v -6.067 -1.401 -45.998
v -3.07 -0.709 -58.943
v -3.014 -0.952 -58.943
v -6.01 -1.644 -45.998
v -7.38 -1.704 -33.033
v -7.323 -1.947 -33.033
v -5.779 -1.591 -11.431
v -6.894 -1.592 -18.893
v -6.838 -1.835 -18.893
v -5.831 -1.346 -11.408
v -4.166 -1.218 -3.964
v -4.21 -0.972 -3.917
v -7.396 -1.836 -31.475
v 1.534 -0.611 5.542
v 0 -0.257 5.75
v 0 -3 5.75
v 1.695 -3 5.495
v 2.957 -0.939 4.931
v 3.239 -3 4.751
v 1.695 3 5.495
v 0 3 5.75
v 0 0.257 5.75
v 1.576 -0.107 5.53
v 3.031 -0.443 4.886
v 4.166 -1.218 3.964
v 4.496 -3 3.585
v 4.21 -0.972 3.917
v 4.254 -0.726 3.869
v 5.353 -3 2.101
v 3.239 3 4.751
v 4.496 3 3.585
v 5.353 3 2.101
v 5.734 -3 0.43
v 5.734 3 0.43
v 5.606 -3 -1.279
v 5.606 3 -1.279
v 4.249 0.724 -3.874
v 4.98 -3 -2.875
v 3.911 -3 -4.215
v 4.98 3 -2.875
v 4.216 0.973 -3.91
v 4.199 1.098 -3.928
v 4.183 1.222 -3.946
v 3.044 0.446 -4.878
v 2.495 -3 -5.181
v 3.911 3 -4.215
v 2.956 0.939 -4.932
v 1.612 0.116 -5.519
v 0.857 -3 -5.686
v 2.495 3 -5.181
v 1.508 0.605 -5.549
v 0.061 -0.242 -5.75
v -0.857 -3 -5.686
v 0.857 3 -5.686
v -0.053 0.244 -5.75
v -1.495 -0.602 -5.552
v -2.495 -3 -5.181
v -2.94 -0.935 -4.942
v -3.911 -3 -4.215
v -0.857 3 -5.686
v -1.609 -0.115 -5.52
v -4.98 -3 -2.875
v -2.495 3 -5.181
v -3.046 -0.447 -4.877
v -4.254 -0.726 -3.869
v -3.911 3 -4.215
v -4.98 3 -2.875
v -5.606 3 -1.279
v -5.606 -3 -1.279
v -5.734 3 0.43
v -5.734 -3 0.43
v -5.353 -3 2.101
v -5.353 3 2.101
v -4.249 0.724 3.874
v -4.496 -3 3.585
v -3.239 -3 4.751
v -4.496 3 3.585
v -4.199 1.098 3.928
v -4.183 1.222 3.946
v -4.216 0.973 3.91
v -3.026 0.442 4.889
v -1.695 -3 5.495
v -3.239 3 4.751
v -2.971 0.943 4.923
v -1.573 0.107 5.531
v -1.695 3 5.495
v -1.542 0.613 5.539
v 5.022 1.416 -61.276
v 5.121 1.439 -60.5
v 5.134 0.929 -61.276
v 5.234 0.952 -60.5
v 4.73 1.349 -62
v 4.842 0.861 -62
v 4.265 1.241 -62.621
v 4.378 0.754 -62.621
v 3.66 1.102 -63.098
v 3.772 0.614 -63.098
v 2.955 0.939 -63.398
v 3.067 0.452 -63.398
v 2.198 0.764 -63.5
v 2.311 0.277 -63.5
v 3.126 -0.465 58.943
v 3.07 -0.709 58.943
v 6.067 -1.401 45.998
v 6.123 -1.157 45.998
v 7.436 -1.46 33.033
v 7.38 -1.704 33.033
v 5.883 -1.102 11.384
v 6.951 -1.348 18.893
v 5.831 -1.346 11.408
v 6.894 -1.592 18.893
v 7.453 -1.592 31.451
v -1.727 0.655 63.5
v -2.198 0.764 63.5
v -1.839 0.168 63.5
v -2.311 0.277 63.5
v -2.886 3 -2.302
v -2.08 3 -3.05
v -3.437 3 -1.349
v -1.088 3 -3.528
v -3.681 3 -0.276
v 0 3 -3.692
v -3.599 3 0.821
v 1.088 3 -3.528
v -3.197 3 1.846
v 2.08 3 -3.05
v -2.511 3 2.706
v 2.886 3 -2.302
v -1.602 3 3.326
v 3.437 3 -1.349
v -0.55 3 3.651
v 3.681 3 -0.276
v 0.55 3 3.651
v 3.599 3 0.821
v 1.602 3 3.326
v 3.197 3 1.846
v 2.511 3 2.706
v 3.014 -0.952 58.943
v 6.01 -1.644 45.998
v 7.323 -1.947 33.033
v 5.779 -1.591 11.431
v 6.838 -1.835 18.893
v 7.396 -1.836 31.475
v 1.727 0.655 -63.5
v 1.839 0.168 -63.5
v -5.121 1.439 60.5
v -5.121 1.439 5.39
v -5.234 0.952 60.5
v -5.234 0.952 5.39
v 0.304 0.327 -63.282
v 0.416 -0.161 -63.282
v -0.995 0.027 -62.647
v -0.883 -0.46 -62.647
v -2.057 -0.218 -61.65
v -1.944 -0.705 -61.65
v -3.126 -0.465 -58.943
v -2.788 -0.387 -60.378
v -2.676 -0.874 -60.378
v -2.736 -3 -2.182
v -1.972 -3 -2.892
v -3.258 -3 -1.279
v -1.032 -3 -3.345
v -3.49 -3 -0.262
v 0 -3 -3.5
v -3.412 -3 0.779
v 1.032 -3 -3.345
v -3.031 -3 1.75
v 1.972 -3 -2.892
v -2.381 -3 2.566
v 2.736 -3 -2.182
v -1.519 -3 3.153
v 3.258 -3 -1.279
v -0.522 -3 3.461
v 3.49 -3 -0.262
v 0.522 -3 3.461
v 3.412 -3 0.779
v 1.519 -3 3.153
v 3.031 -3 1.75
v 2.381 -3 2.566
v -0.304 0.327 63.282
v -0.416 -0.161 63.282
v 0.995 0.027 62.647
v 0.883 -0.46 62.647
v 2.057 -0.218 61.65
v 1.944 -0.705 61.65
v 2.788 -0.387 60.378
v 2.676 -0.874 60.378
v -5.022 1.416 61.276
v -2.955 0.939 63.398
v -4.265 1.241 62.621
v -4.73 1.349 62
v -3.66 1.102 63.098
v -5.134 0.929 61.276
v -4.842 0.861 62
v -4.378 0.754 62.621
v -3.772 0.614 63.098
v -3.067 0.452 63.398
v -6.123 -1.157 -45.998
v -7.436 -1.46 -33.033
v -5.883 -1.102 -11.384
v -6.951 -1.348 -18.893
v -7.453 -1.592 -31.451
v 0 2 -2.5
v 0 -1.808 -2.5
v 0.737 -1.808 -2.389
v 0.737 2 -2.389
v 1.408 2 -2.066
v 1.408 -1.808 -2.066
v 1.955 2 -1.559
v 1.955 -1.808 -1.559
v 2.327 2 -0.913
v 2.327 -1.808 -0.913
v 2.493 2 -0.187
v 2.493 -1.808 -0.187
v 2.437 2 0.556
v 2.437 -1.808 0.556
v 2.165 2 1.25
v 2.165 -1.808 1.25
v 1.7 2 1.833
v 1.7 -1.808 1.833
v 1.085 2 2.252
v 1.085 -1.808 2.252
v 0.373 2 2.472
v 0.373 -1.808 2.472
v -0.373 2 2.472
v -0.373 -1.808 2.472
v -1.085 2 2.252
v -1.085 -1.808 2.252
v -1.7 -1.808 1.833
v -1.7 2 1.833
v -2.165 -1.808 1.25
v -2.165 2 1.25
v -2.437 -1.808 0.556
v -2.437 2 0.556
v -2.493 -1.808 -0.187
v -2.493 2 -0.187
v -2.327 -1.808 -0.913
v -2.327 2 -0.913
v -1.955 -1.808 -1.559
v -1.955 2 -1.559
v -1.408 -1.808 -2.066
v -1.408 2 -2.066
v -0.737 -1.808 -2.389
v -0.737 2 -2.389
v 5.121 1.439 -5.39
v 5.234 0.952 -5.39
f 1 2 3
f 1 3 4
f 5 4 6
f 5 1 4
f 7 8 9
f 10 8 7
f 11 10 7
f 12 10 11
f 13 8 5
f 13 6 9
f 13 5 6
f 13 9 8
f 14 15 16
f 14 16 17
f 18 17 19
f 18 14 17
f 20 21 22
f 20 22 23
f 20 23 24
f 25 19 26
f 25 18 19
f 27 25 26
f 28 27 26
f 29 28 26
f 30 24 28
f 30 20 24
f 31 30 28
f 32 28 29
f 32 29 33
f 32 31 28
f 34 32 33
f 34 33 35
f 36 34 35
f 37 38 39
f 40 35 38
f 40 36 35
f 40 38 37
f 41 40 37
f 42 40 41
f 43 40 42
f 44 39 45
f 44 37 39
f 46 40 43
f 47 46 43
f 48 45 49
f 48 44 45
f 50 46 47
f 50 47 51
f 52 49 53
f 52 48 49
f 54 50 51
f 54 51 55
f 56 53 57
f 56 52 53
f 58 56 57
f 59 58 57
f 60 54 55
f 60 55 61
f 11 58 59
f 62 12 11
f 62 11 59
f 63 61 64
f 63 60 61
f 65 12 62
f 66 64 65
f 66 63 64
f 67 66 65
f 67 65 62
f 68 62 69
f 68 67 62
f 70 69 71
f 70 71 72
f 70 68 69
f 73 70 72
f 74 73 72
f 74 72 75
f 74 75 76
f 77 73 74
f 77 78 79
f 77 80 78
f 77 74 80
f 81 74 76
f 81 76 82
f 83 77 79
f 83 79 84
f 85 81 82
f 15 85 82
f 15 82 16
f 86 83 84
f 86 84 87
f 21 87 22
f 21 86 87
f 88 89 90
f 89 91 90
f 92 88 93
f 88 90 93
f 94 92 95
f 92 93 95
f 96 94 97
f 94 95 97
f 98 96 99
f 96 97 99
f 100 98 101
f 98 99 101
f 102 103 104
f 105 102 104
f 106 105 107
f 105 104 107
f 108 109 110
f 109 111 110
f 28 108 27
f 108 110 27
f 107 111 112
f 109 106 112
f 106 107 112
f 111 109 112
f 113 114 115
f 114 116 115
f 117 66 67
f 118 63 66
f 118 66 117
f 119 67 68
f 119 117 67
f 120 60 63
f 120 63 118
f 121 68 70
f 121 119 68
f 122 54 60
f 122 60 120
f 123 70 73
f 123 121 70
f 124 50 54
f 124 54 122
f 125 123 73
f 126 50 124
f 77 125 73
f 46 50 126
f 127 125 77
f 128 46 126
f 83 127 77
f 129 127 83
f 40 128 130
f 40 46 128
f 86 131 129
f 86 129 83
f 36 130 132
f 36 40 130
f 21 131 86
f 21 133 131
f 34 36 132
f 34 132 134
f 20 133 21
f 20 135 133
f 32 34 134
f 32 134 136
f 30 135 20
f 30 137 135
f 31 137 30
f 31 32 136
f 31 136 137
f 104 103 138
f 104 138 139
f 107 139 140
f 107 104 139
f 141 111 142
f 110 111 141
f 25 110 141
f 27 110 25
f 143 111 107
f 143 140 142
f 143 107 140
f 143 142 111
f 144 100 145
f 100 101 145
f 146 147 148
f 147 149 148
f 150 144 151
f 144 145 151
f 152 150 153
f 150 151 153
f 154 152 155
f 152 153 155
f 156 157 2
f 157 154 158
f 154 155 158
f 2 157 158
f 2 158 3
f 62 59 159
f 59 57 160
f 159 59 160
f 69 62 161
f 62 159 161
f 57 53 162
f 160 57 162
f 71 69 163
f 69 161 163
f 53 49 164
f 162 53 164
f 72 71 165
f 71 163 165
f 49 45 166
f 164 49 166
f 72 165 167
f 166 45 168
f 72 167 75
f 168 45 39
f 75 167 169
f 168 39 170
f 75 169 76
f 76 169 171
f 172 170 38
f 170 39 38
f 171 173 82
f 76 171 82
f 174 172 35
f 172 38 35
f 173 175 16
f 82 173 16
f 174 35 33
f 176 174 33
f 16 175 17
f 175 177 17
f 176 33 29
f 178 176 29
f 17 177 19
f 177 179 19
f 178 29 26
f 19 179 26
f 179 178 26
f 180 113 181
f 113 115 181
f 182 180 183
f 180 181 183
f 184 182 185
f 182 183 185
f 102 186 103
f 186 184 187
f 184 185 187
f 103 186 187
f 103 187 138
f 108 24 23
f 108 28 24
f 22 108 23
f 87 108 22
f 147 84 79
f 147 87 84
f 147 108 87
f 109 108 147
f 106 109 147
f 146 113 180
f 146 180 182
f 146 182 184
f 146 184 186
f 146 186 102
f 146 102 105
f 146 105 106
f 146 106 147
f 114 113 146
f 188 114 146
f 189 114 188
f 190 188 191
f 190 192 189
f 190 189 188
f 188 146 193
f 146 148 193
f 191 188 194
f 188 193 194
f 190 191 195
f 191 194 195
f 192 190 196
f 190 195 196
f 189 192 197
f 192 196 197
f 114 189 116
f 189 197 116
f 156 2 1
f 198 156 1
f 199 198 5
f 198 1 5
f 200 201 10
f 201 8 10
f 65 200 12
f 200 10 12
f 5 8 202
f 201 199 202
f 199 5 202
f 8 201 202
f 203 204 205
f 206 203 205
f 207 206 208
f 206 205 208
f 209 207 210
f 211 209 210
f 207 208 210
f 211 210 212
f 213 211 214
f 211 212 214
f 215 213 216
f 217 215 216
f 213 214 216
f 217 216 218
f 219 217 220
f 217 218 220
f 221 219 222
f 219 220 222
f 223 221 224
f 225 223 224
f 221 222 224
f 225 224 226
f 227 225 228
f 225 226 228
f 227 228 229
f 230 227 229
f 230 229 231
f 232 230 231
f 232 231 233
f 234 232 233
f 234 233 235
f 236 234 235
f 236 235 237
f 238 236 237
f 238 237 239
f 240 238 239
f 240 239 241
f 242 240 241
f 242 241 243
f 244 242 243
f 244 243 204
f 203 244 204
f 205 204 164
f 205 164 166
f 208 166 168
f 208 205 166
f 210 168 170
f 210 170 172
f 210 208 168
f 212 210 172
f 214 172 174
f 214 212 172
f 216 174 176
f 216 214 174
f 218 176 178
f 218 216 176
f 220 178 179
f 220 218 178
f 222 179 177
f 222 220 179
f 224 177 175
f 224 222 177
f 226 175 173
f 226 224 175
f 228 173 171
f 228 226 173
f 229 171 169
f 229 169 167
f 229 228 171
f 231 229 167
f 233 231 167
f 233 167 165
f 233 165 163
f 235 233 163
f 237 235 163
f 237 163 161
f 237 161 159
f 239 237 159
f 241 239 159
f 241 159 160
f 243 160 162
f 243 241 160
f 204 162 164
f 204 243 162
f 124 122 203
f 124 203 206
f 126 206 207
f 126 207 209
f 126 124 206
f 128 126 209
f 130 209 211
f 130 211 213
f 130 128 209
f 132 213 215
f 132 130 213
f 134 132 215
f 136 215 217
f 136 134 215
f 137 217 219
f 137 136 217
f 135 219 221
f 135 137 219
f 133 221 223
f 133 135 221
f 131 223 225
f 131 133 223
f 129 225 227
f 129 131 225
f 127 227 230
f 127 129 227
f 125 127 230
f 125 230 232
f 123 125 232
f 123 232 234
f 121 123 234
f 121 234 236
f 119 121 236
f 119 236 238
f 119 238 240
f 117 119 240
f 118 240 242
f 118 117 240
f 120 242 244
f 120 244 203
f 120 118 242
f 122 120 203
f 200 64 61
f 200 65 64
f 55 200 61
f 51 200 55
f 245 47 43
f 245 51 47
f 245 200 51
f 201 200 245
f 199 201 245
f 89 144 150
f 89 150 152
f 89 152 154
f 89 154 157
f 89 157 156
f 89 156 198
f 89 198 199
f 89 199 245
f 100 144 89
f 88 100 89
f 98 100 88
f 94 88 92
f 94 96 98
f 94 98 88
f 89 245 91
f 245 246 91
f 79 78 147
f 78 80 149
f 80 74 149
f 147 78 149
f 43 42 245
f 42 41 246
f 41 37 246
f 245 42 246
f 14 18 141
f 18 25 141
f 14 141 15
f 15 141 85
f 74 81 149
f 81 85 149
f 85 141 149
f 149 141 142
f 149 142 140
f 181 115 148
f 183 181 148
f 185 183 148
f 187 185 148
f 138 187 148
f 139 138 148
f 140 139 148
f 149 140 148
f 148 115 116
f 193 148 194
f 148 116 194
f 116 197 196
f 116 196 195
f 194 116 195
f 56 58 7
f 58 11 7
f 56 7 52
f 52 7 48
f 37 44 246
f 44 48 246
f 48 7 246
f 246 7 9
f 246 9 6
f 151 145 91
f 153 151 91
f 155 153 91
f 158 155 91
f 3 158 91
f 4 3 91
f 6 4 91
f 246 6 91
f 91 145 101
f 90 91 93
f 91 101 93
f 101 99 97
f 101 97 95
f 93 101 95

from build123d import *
from OCP.BRepFilletAPI import BRepFilletAPI_MakeChamfer

# Parameters (mm, degrees)
SKETCH_1_R               = 5.75
EXTRUDE_1_DEPTH          = 3
EXTRUDE_2_DEPTH          = 0.25
PATTERN_CIRCULAR_1_COUNT = 2
SKETCH_4_R               = 2.5
CUT_EXTRUDE_1_DEPTH      = 65.222479954
CHAMFER_1_SIZE           = 1
CHAMFER_1_SIZE2          = 1.191753593


with BuildPart() as part:
    # 草图1 → 凸台-拉伸1 (new, symmetric)
    with BuildSketch(Plane(origin=(0, 0, 0), x_dir=(1, 0, 0), z_dir=(0, 1, 0))):
        with Locations(Location((0, 0, 0), (0, 0, 270))):
            Circle(SKETCH_1_R)
    extrude(amount=EXTRUDE_1_DEPTH, both=True)

    # 草图3 → 凸台-拉伸2 (add, symmetric)
    with BuildSketch(Plane(origin=(0, 0, 0), x_dir=(0.9743700647852351, -0.22495105434386545, 0), z_dir=(-0.22495105434386545, -0.9743700647852351, 0))):
        with BuildLine():
            Line((-3.916367875, 3.295399757), (-5.31388764, 5.389585316))
            Line((-5.31388764, 5.389585316), (-5.31388764, 60.5))
            ThreePointArc((-5.31388764, 60.5), (-4.435207984, 62.621320344), (-2.31388764, 63.5))
            Line((-2.31388764, 63.5), (-1.829824276, 63.5))
            ThreePointArc((-1.829824276, 63.5), (1.545488809, 62.188802187), (3.15052064, 58.942904631))
            add(Edge.make_bspline(
                [(3.15052064, 58.942904631), (11.816057199, 30.493674225), (3.76071755, 1.848135525)],
                knots=[0, 0, 0, 1, 1, 1], degree=2))
            add(Edge.make_bspline(
                [(-3.916367875, 3.295399757), (0.478704758, 7.563280094), (3.76071755, 1.848135525)],
                knots=[0, 0, 0, 1, 1, 1], degree=2))
        make_face()
    extrude_2 = extrude(amount=EXTRUDE_2_DEPTH, both=True)

    # 阵列(圆周)1: 凸台-拉伸2 ×2 about axis
    pattern_circular_1_axis = Axis((0, -3, 0), (0, 1, 0))
    for i in range(1, PATTERN_CIRCULAR_1_COUNT):
        add(extrude_2.rotate(pattern_circular_1_axis, i * 360 / PATTERN_CIRCULAR_1_COUNT))

    # 草图4 → 切除-拉伸1 (cut, through all)
    with BuildSketch(Plane.XZ.offset(3)):
        with Locations(Location((0, 0, 0), (0, 0, 270))):
            Circle(SKETCH_4_R)
    extrude(amount=-CUT_EXTRUDE_1_DEPTH, mode=Mode.SUBTRACT)

    # 倒角1: one chamfer whose edges measure the first distance from different faces: ONE call of the kernel's chamfer builder (chamfer() names one face for all edges)
    chamfer_1_edges_1 = [part.edges().sort_by_distance(p)[0] for p in [
        (0, 3, 2.5),
    ]]
    chamfer_1_side_1 = [part.faces().sort_by_distance(p)[0] for p in [
        (0, 0, 2.5),
    ]]
    chamfer_1_edges_2 = [part.edges().sort_by_distance(p)[0] for p in [
        (0, -3, 2.5),
    ]]
    chamfer_1_side_2 = [part.faces().sort_by_distance(p)[0] for p in [
        (0, -3, -5.58736544),
    ]]
    chamfer_1 = BRepFilletAPI_MakeChamfer(part.part.solid().wrapped)
    for e in chamfer_1_edges_1:
        chamfer_1.Add(CHAMFER_1_SIZE, CHAMFER_1_SIZE2, e.wrapped, chamfer_1_side_1[0].wrapped)  # the first distance lies on this face
    for e in chamfer_1_edges_2:
        chamfer_1.Add(CHAMFER_1_SIZE, CHAMFER_1_SIZE2, e.wrapped, chamfer_1_side_2[0].wrapped)  # the first distance lies on this face
    add(Compound.cast(chamfer_1.Shape()), mode=Mode.REPLACE)


solid = part.part
